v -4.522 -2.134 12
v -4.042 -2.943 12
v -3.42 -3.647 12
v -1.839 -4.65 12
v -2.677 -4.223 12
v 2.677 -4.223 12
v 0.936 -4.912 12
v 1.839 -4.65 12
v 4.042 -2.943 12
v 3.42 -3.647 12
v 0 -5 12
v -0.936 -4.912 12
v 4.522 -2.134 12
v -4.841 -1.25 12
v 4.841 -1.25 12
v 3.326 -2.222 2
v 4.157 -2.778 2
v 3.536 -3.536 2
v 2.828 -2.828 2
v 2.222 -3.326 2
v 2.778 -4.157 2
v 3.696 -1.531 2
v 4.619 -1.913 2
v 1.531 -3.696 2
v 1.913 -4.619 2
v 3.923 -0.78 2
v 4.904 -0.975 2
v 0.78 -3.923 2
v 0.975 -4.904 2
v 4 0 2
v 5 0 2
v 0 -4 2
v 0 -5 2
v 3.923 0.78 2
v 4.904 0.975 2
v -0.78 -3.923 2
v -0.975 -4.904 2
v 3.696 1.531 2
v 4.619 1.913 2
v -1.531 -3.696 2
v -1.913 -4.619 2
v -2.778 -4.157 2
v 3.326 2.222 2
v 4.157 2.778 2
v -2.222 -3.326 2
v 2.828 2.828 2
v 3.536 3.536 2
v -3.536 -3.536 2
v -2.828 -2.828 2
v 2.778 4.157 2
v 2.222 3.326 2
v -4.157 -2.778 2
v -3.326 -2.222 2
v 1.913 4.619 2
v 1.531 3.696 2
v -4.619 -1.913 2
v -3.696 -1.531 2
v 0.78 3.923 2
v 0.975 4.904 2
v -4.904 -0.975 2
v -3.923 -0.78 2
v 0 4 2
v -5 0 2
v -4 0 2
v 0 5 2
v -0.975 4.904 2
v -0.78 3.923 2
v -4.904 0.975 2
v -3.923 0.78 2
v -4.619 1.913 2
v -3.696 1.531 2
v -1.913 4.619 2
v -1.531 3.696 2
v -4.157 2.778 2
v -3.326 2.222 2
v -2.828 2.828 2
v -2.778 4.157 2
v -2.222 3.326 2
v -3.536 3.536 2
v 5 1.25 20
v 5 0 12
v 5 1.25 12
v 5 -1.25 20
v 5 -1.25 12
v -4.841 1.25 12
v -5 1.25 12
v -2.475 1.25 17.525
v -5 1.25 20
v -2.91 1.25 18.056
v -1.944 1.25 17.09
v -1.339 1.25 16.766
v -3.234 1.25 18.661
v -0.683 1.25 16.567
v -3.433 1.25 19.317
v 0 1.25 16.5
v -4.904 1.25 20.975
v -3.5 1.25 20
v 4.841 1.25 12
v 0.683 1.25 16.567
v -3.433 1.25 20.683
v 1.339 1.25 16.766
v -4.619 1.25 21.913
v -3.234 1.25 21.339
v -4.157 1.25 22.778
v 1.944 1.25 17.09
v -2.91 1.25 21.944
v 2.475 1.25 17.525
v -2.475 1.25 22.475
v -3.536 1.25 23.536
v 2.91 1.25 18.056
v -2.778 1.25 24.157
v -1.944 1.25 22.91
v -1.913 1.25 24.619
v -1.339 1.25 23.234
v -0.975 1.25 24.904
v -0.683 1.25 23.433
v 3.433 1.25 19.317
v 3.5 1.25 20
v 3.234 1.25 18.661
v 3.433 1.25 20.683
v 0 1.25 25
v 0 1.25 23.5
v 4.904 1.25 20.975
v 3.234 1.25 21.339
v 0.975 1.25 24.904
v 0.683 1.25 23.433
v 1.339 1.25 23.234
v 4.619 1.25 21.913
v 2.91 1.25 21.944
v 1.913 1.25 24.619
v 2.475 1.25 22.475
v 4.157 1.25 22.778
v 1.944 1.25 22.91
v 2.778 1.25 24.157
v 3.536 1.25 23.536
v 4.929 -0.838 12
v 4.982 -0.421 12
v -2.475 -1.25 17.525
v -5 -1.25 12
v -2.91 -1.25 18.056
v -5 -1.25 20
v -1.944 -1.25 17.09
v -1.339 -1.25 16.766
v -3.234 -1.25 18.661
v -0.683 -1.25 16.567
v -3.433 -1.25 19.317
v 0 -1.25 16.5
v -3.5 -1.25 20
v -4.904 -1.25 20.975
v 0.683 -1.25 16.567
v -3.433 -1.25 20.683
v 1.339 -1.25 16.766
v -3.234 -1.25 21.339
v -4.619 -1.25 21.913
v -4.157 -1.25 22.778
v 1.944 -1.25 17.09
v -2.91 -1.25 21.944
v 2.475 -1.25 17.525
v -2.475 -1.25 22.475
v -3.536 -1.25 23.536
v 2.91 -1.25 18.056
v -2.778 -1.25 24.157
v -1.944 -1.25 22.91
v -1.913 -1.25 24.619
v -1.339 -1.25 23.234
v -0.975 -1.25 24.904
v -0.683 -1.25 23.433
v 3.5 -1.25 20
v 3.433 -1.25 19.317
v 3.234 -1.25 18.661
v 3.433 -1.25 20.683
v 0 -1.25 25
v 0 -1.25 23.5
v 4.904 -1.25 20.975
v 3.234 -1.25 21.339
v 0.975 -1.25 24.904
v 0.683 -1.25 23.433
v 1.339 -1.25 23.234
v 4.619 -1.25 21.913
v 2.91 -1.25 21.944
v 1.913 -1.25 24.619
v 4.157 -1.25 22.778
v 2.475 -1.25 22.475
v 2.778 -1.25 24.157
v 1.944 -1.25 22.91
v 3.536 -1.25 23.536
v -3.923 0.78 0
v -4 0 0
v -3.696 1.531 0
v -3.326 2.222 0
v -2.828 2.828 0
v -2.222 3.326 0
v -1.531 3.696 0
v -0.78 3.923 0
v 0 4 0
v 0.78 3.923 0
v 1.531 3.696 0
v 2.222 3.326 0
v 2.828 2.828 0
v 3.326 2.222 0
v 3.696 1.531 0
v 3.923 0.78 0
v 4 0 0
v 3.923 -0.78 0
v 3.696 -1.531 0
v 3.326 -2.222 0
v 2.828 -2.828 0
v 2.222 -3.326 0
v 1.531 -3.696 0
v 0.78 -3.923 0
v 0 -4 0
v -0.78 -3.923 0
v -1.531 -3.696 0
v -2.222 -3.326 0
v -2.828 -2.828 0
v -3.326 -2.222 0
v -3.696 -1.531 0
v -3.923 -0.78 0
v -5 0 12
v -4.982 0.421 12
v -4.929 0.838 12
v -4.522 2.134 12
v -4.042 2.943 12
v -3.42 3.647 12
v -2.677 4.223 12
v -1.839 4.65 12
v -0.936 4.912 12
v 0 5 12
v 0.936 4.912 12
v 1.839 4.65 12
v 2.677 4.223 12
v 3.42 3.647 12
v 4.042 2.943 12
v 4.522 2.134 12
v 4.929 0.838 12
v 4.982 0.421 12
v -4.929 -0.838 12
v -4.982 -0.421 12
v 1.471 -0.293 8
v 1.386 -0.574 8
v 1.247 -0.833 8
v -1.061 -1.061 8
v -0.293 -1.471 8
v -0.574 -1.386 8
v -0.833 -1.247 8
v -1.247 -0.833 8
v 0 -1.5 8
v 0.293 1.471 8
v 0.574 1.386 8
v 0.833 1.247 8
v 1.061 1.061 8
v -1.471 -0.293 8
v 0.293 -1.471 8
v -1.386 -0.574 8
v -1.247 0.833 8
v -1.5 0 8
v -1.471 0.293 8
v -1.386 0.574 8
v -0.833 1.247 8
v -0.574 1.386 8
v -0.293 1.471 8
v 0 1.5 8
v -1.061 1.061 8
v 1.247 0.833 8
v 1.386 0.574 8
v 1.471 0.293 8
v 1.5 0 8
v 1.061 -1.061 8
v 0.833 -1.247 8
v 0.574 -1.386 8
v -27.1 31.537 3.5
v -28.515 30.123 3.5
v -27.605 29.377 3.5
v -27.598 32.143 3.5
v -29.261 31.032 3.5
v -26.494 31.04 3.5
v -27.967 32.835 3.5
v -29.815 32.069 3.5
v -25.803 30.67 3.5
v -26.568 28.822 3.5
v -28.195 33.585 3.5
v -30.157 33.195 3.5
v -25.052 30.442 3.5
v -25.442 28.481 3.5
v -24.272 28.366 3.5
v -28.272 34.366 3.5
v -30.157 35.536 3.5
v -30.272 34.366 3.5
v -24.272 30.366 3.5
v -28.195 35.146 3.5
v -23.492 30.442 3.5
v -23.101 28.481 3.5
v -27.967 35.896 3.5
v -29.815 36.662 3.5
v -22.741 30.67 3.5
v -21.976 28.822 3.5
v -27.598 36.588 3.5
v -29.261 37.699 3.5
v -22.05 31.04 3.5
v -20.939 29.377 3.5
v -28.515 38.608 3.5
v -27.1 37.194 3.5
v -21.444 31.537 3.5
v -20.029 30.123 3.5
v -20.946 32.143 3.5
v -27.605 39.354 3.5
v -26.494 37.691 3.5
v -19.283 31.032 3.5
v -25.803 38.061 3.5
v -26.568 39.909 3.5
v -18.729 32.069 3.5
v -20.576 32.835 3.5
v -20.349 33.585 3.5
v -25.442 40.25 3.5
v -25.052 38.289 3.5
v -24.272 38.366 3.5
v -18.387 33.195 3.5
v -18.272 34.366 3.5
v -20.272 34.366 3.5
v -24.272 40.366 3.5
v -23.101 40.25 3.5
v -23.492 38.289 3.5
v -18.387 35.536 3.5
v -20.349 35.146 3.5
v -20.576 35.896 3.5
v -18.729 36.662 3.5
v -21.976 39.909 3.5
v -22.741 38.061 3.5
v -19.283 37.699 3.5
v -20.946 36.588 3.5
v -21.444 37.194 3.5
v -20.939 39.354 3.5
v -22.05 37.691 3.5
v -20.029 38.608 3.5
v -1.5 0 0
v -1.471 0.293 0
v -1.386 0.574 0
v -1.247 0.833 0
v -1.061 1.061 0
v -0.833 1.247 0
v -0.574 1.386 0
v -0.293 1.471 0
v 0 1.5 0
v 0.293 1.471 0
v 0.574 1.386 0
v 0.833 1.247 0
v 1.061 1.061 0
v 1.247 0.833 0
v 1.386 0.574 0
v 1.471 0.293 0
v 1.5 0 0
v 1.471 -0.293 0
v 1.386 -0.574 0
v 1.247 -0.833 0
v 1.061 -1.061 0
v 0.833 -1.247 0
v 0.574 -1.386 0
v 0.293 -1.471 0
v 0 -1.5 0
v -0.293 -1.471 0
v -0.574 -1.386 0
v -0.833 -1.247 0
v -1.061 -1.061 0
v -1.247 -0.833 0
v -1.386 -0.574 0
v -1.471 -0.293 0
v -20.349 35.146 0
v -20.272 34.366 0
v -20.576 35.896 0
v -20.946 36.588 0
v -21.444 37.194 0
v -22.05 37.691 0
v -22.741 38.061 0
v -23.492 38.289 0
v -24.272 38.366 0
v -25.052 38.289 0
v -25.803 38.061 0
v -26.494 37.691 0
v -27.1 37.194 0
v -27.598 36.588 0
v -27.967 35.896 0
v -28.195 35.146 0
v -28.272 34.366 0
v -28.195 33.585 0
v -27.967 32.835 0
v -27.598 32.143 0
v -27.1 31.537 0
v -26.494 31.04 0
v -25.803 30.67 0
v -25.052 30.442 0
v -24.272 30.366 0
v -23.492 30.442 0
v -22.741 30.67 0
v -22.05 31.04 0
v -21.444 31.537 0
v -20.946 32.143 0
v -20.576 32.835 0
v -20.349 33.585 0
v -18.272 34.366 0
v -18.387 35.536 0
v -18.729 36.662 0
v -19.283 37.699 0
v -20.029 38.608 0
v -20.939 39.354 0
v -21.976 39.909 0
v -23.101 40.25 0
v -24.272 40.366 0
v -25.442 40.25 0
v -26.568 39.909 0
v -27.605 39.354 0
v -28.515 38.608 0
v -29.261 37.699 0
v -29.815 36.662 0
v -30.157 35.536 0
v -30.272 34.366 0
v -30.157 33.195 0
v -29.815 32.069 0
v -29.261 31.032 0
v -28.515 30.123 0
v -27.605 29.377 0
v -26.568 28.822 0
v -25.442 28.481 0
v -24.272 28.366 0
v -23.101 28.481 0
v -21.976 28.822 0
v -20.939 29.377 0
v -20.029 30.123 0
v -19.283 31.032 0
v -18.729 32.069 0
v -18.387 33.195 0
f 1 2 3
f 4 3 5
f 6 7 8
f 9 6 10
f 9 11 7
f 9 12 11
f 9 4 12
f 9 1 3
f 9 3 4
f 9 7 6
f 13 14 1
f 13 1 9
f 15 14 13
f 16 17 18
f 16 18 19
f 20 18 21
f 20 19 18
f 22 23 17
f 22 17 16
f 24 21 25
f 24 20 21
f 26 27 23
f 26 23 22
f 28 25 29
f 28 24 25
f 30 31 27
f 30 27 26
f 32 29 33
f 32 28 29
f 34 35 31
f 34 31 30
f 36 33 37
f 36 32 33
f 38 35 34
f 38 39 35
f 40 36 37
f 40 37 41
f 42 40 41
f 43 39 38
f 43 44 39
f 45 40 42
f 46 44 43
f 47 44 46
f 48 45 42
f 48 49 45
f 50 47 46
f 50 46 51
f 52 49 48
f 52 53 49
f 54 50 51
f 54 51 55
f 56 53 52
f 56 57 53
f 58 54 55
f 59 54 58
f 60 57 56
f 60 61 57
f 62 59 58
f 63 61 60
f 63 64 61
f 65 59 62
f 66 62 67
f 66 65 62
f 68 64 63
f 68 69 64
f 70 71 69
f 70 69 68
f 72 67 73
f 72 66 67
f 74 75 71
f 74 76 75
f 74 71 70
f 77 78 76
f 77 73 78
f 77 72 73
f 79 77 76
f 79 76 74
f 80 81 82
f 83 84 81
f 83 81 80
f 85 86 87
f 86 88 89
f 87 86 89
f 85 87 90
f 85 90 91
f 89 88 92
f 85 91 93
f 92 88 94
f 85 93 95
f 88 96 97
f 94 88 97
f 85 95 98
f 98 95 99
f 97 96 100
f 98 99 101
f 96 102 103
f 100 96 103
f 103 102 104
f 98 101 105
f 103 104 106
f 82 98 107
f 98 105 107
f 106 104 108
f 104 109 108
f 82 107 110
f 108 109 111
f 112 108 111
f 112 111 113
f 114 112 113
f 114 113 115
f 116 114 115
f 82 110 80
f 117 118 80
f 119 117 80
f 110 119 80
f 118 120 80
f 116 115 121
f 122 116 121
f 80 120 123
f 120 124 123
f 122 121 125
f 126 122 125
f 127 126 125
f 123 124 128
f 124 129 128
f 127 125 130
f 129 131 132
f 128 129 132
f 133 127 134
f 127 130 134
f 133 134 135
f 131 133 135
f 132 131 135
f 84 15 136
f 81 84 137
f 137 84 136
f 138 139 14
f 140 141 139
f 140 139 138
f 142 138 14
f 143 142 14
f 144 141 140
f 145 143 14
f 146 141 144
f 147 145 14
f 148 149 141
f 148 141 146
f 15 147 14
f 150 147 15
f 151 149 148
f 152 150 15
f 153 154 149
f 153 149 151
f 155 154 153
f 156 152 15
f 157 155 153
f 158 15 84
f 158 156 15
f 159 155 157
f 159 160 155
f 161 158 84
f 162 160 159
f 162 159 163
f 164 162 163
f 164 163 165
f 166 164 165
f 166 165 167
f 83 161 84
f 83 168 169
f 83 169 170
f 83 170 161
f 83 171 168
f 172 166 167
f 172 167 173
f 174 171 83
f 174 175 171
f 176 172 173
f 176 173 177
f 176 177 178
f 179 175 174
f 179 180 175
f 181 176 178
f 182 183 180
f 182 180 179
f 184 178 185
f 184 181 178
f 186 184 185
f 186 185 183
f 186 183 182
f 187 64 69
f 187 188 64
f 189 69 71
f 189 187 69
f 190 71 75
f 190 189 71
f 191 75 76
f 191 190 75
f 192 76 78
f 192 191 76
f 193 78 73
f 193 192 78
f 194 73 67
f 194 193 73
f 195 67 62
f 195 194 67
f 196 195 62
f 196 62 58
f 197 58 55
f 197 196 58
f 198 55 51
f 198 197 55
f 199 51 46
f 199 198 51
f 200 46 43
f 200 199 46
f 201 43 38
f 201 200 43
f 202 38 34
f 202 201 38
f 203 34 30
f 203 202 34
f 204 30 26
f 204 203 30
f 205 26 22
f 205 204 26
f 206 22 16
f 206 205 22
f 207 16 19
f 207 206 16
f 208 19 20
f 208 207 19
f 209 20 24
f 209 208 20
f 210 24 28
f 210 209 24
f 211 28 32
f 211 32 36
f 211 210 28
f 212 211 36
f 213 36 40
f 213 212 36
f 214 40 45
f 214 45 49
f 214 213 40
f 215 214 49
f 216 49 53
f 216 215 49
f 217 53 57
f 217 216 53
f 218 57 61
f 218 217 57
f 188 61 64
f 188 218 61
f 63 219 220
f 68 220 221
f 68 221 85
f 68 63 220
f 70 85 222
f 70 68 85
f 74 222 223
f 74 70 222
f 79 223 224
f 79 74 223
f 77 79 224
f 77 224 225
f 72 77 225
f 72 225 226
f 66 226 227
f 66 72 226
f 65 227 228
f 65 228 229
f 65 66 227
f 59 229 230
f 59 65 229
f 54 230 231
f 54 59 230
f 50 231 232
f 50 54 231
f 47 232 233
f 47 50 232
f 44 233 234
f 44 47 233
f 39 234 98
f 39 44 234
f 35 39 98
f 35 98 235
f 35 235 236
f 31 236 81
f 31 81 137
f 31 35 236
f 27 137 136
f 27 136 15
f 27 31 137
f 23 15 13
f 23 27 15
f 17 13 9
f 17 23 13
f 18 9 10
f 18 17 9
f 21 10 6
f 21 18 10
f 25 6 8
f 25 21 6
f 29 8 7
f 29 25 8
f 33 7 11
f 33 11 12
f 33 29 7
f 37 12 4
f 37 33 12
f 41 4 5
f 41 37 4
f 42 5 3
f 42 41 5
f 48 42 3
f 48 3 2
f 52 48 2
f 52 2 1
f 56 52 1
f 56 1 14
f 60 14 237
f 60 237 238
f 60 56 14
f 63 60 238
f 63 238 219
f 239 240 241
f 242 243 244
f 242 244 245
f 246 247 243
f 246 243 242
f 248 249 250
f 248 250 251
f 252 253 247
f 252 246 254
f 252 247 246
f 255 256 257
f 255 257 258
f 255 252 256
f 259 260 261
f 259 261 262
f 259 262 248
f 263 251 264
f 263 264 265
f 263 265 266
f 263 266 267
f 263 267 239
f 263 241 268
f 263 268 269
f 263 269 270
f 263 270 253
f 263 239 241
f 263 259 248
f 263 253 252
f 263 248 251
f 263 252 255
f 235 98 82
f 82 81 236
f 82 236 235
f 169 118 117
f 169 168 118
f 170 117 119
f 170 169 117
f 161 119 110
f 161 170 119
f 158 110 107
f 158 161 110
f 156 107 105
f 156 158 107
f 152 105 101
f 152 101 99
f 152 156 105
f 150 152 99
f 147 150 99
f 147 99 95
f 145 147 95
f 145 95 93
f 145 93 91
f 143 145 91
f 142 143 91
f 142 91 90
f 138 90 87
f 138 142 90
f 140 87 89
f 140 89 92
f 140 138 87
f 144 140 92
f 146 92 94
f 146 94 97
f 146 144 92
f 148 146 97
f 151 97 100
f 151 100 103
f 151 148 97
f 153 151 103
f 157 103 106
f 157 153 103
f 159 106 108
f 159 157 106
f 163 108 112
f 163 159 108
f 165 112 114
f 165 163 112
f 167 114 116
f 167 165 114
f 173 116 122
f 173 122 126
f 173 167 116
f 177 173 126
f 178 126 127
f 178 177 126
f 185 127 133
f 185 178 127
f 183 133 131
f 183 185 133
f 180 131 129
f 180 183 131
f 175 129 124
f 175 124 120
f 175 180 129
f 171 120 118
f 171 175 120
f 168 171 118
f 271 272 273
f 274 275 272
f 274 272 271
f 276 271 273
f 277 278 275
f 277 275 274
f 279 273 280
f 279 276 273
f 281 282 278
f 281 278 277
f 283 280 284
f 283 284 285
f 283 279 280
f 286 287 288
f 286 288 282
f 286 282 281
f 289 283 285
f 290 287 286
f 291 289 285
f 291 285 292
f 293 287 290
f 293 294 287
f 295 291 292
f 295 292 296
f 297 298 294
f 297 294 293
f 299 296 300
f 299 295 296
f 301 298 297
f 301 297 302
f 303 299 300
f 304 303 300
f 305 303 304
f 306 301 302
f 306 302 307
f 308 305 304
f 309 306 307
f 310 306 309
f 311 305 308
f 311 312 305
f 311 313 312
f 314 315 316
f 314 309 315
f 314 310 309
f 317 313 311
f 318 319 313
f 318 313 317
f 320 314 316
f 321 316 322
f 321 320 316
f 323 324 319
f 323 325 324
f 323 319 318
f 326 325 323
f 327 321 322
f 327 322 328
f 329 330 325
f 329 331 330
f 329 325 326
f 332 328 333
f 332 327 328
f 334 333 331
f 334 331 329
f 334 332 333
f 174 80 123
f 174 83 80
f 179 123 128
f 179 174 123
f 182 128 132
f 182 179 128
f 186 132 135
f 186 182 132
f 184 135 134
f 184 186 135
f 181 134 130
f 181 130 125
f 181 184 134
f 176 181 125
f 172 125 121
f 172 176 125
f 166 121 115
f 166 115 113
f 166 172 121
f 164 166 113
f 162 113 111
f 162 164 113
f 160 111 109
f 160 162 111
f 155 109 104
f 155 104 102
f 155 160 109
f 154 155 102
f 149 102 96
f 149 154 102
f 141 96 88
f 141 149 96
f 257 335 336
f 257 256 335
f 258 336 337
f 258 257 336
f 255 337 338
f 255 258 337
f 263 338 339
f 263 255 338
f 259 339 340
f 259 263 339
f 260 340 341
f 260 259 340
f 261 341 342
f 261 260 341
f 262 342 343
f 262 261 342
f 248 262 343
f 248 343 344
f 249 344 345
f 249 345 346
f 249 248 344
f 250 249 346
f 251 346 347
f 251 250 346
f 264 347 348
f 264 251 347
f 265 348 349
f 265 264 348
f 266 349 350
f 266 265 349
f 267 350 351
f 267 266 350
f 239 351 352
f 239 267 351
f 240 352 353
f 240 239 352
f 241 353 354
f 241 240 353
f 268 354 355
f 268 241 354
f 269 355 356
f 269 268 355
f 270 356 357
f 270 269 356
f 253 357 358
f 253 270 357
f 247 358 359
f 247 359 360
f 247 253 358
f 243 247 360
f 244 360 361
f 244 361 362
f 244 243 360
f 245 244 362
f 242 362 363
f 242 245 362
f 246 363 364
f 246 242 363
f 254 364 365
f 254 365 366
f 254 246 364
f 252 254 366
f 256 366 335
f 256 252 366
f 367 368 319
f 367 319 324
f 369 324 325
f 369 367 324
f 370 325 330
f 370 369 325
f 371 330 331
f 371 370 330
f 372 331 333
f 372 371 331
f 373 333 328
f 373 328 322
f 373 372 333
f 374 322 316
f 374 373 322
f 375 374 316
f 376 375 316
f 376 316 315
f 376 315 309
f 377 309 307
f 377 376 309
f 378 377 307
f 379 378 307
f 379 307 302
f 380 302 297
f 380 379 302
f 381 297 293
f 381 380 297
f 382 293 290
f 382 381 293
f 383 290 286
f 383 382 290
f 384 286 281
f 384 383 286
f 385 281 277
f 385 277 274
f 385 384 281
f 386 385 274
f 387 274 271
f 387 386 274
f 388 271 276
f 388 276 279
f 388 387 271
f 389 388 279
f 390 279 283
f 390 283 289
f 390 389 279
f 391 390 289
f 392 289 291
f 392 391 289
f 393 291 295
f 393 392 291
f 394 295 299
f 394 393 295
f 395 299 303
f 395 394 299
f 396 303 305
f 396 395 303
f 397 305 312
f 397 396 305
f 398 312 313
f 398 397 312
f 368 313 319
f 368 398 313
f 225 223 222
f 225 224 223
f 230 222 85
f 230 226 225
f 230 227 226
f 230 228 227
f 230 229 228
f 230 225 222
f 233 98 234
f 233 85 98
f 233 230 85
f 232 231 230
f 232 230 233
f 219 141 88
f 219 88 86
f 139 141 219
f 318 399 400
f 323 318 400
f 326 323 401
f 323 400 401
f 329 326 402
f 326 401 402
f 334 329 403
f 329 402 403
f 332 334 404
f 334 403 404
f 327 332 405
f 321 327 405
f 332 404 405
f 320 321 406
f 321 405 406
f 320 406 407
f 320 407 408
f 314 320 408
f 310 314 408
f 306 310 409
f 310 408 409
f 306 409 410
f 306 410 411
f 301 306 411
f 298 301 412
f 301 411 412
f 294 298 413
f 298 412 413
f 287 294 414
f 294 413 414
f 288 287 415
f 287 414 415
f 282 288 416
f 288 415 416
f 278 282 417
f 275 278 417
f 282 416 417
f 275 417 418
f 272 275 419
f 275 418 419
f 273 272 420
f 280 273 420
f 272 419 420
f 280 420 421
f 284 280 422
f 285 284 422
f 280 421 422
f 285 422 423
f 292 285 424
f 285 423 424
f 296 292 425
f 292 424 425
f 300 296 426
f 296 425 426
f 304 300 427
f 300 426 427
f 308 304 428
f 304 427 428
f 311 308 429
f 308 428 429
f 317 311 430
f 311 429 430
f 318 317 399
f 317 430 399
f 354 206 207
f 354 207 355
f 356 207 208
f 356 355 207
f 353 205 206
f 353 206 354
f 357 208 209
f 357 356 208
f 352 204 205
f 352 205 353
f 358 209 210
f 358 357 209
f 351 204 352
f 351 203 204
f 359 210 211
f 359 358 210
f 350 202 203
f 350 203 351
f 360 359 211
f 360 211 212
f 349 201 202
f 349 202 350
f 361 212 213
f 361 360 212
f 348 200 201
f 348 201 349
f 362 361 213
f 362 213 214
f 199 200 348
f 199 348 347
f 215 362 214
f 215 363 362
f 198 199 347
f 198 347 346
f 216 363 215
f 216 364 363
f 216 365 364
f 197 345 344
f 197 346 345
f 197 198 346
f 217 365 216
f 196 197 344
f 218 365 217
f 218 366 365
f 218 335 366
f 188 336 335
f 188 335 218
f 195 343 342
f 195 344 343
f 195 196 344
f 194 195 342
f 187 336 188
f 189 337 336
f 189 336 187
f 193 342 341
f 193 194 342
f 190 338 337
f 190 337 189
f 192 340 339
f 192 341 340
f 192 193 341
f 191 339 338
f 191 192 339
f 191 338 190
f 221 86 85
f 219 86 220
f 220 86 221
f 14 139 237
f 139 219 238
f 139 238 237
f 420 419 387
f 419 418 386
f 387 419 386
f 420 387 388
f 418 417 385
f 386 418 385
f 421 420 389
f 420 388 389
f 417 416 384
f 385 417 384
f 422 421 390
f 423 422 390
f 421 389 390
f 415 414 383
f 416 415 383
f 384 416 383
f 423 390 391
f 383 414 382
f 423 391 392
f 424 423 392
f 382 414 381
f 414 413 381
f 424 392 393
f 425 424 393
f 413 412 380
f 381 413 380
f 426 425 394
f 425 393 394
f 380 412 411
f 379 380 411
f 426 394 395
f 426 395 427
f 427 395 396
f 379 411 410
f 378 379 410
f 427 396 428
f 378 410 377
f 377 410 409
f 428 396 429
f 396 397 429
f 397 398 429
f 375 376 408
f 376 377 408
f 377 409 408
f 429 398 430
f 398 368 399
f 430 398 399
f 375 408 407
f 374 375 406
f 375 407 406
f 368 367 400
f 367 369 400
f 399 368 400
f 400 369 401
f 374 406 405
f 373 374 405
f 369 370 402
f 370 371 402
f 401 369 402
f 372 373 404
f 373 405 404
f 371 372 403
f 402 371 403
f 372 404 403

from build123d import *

# Parameters (mm, degrees)
F2_DEPTH = 1.25
F3_R     = 6
F3_R_2   = 4
F4_DEPTH = 3.5


with BuildPart() as f1:
    # F0 (on Front) → F1 (revolve)
    with BuildSketch(Plane.XZ):
        Polygon((-4, 0), (-1.5, 0), (-1.5, 8), (0, 8), (0, 12), (-5, 12), (-5, 2), (-4, 2), align=None)
    revolve(axis=Axis((0, 0, -14.899148), (0, 0, -1)))

    # F0 (on Front) → F2 (join, symmetric)
    with BuildSketch(Plane.XZ):
        with BuildLine():
            ThreePointArc((5, 20), (0, 25), (-5, 20))
            Line((-5, 20), (-3.5, 20))
            ThreePointArc((-3.5, 20), (0, 23.5), (3.5, 20))
            Line((3.5, 20), (5, 20))
        make_face()
        with BuildLine():
            Line((-5, 12), (0, 12))
            Line((0, 12), (5, 12))
            Line((5, 12), (5, 20))
            Line((5, 20), (3.5, 20))
            ThreePointArc((3.5, 20), (0, 16.5), (-3.5, 20))
            Line((-3.5, 20), (-5, 20))
            Line((-5, 20), (-5, 12))
        make_face()
    extrude(amount=F2_DEPTH, both=True)


with BuildPart() as f4:
    # F3 (on Top) → F4 (new body)
    with BuildSketch(Plane.XY):
        with Locations((-24.271946, 34.365591)):
            Circle(F3_R)
        with Locations((-24.271946, 34.365591)):
            Circle(F3_R_2, mode=Mode.SUBTRACT)
    extrude(amount=F4_DEPTH)


solid = Compound([f1.part, f4.part])
